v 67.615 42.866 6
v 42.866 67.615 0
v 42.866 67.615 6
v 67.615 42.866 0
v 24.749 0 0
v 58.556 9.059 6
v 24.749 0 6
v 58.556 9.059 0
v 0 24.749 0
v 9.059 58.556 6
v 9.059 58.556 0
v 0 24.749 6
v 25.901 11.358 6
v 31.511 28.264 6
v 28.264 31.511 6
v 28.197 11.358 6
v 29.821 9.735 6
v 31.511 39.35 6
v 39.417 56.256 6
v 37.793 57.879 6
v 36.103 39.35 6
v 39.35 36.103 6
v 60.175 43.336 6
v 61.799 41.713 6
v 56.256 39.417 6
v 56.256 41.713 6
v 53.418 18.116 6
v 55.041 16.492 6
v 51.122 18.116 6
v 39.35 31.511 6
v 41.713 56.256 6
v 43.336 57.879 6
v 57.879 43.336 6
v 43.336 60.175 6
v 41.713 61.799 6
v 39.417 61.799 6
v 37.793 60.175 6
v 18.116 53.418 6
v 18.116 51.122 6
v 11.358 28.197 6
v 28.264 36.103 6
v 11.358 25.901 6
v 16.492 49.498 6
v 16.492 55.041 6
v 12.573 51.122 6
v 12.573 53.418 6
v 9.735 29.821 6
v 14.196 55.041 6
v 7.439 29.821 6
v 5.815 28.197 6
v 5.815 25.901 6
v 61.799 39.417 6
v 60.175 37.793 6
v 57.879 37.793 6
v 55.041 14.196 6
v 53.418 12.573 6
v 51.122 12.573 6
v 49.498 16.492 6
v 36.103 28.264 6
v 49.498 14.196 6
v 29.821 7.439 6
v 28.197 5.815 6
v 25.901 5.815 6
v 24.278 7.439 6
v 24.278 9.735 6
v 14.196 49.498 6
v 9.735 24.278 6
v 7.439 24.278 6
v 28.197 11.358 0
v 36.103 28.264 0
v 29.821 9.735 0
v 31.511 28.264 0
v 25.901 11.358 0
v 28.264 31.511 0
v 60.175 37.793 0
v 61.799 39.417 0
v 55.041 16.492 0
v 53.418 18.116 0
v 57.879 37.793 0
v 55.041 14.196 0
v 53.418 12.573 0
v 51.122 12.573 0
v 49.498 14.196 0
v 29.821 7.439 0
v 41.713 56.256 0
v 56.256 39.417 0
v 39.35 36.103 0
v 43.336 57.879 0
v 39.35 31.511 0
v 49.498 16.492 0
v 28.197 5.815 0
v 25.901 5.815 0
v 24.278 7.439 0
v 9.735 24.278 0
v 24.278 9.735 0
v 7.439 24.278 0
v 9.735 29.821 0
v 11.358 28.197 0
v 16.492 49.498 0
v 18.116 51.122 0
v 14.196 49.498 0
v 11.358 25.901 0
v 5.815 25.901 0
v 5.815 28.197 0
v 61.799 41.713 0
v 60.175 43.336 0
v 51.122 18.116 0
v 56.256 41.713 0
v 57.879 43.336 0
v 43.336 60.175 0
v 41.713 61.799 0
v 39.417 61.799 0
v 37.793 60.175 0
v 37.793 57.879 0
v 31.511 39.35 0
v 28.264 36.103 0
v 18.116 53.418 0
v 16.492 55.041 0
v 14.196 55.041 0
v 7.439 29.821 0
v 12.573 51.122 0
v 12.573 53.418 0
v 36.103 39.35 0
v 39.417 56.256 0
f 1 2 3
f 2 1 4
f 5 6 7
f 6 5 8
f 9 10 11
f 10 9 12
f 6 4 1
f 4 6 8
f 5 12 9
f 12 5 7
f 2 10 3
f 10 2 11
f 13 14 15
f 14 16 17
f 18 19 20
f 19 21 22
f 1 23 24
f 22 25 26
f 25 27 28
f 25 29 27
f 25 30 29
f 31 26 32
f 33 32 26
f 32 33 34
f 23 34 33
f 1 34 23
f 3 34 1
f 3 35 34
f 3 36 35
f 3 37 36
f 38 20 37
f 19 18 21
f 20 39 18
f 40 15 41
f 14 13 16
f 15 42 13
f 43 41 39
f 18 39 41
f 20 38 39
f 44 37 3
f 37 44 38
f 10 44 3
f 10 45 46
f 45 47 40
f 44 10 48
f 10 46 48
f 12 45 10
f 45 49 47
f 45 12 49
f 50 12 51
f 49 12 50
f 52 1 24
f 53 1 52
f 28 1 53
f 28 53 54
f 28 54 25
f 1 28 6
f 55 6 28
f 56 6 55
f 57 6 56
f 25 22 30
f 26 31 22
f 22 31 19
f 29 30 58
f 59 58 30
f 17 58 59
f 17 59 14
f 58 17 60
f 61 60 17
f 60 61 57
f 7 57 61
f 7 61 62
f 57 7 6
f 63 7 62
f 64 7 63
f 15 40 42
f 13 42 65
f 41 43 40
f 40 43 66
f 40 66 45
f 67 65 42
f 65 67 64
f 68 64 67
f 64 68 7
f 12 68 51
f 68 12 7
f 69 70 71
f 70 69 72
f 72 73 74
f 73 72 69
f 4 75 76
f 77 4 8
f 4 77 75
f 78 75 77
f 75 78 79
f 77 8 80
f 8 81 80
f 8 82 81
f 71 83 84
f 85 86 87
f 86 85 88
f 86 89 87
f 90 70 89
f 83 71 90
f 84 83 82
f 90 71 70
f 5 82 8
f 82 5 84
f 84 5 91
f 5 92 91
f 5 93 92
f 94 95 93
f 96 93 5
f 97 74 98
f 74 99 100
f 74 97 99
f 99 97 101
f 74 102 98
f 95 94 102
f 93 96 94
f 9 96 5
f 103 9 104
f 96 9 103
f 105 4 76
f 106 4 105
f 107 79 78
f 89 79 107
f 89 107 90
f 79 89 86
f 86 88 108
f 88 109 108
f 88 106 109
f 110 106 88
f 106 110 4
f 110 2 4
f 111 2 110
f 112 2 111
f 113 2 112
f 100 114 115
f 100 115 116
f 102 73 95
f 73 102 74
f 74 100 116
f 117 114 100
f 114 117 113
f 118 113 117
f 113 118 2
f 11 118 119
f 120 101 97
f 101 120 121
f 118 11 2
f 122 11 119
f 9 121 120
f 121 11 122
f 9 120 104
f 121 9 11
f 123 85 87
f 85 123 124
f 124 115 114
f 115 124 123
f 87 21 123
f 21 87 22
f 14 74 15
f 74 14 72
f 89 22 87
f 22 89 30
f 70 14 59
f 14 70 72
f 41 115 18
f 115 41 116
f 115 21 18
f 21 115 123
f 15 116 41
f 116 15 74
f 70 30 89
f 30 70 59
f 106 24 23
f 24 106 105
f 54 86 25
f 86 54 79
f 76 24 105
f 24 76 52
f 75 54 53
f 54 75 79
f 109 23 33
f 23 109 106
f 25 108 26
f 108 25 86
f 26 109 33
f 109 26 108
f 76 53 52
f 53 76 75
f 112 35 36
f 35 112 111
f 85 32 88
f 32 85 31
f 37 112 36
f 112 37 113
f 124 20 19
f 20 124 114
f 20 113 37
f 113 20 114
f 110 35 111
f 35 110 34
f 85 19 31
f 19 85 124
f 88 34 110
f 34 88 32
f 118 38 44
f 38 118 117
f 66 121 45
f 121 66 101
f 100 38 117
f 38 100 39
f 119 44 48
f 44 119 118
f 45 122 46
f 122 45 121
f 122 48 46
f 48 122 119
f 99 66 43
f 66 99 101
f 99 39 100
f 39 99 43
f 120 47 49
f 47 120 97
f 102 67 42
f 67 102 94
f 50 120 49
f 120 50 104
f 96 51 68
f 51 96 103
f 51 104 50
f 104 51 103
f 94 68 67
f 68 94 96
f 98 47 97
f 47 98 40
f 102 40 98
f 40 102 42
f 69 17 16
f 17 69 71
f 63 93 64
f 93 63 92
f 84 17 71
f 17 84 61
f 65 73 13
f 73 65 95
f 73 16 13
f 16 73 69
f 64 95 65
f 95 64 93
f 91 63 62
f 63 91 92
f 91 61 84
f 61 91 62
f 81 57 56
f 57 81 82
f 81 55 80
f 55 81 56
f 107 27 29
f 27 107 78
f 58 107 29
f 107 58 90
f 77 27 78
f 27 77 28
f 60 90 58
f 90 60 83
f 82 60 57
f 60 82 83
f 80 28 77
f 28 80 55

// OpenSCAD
$fn = 32;

// ----------------------------------------------------------------------
// Polygon plate: 6-gon R35, 6 bolt windows
// ----------------------------------------------------------------------

// --- parameters (mm) ---
sides = 6;                // number of polygon sides
plate_r = 35;             // circumscribed radius of the polygon
bore_r = 6;               // centre bore radius
bolts = 6;                // number of bolt windows
ring_r = 26.11;           // bolt-circle radius
bolt_r = 3;               // bolt window radius
plate_t = 6;              // plate thickness, Z (extrusion height)
fit_tol = 0.02;           // declared fit tolerance (prompt contract)
free_tol = 0.2;           // declared free tolerance (prompt contract)

plate_d = 2 * plate_r;  // circumscribed diameter
bore_d = 2 * bore_r;  // centre bore diameter
bolt_d = 2 * bolt_r;  // bolt window diameter
ring_d = 2 * ring_r;  // bolt-circle diameter

profile = [[67.615, 42.866], [42.866, 67.615], [9.059, 58.556], [0, 24.749], [24.749, 0], [58.556, 9.059]];  // primary outline, 6 points, counter clockwise
void_1 = [[39.35, 36.103], [36.103, 39.35], [31.511, 39.35], [28.264, 36.103], [28.264, 31.511], [31.511, 28.264], [36.103, 28.264], [39.35, 31.511]];  // centre bore, 8 points
void_2 = [[61.799, 41.713], [60.175, 43.336], [57.879, 43.336], [56.256, 41.713], [56.256, 39.417], [57.879, 37.793], [60.175, 37.793], [61.799, 39.417]];  // bolt window 1, 8 points
void_3 = [[43.336, 60.175], [41.713, 61.799], [39.417, 61.799], [37.793, 60.175], [37.793, 57.879], [39.417, 56.256], [41.713, 56.256], [43.336, 57.879]];  // bolt window 2, 8 points
void_4 = [[18.116, 53.418], [16.492, 55.041], [14.196, 55.041], [12.573, 53.418], [12.573, 51.122], [14.196, 49.498], [16.492, 49.498], [18.116, 51.122]];  // bolt window 3, 8 points
void_5 = [[11.358, 28.197], [9.735, 29.821], [7.439, 29.821], [5.815, 28.197], [5.815, 25.901], [7.439, 24.278], [9.735, 24.278], [11.358, 25.901]];  // bolt window 4, 8 points
void_6 = [[29.821, 9.735], [28.197, 11.358], [25.901, 11.358], [24.278, 9.735], [24.278, 7.439], [25.901, 5.815], [28.197, 5.815], [29.821, 7.439]];  // bolt window 5, 8 points
void_7 = [[55.041, 16.492], [53.418, 18.116], [51.122, 18.116], [49.498, 16.492], [49.498, 14.196], [51.122, 12.573], [53.418, 12.573], [55.041, 14.196]];  // bolt window 6, 8 points

// --- the one profile operation ---
difference() {
  linear_extrude(height = plate_t) polygon(points = profile);
  translate([0, 0, -1])
    linear_extrude(height = plate_t + 2) polygon(points = void_1);
  translate([0, 0, -1])
    linear_extrude(height = plate_t + 2) polygon(points = void_2);
  translate([0, 0, -1])
    linear_extrude(height = plate_t + 2) polygon(points = void_3);
  translate([0, 0, -1])
    linear_extrude(height = plate_t + 2) polygon(points = void_4);
  translate([0, 0, -1])
    linear_extrude(height = plate_t + 2) polygon(points = void_5);
  translate([0, 0, -1])
    linear_extrude(height = plate_t + 2) polygon(points = void_6);
  translate([0, 0, -1])
    linear_extrude(height = plate_t + 2) polygon(points = void_7);
}
